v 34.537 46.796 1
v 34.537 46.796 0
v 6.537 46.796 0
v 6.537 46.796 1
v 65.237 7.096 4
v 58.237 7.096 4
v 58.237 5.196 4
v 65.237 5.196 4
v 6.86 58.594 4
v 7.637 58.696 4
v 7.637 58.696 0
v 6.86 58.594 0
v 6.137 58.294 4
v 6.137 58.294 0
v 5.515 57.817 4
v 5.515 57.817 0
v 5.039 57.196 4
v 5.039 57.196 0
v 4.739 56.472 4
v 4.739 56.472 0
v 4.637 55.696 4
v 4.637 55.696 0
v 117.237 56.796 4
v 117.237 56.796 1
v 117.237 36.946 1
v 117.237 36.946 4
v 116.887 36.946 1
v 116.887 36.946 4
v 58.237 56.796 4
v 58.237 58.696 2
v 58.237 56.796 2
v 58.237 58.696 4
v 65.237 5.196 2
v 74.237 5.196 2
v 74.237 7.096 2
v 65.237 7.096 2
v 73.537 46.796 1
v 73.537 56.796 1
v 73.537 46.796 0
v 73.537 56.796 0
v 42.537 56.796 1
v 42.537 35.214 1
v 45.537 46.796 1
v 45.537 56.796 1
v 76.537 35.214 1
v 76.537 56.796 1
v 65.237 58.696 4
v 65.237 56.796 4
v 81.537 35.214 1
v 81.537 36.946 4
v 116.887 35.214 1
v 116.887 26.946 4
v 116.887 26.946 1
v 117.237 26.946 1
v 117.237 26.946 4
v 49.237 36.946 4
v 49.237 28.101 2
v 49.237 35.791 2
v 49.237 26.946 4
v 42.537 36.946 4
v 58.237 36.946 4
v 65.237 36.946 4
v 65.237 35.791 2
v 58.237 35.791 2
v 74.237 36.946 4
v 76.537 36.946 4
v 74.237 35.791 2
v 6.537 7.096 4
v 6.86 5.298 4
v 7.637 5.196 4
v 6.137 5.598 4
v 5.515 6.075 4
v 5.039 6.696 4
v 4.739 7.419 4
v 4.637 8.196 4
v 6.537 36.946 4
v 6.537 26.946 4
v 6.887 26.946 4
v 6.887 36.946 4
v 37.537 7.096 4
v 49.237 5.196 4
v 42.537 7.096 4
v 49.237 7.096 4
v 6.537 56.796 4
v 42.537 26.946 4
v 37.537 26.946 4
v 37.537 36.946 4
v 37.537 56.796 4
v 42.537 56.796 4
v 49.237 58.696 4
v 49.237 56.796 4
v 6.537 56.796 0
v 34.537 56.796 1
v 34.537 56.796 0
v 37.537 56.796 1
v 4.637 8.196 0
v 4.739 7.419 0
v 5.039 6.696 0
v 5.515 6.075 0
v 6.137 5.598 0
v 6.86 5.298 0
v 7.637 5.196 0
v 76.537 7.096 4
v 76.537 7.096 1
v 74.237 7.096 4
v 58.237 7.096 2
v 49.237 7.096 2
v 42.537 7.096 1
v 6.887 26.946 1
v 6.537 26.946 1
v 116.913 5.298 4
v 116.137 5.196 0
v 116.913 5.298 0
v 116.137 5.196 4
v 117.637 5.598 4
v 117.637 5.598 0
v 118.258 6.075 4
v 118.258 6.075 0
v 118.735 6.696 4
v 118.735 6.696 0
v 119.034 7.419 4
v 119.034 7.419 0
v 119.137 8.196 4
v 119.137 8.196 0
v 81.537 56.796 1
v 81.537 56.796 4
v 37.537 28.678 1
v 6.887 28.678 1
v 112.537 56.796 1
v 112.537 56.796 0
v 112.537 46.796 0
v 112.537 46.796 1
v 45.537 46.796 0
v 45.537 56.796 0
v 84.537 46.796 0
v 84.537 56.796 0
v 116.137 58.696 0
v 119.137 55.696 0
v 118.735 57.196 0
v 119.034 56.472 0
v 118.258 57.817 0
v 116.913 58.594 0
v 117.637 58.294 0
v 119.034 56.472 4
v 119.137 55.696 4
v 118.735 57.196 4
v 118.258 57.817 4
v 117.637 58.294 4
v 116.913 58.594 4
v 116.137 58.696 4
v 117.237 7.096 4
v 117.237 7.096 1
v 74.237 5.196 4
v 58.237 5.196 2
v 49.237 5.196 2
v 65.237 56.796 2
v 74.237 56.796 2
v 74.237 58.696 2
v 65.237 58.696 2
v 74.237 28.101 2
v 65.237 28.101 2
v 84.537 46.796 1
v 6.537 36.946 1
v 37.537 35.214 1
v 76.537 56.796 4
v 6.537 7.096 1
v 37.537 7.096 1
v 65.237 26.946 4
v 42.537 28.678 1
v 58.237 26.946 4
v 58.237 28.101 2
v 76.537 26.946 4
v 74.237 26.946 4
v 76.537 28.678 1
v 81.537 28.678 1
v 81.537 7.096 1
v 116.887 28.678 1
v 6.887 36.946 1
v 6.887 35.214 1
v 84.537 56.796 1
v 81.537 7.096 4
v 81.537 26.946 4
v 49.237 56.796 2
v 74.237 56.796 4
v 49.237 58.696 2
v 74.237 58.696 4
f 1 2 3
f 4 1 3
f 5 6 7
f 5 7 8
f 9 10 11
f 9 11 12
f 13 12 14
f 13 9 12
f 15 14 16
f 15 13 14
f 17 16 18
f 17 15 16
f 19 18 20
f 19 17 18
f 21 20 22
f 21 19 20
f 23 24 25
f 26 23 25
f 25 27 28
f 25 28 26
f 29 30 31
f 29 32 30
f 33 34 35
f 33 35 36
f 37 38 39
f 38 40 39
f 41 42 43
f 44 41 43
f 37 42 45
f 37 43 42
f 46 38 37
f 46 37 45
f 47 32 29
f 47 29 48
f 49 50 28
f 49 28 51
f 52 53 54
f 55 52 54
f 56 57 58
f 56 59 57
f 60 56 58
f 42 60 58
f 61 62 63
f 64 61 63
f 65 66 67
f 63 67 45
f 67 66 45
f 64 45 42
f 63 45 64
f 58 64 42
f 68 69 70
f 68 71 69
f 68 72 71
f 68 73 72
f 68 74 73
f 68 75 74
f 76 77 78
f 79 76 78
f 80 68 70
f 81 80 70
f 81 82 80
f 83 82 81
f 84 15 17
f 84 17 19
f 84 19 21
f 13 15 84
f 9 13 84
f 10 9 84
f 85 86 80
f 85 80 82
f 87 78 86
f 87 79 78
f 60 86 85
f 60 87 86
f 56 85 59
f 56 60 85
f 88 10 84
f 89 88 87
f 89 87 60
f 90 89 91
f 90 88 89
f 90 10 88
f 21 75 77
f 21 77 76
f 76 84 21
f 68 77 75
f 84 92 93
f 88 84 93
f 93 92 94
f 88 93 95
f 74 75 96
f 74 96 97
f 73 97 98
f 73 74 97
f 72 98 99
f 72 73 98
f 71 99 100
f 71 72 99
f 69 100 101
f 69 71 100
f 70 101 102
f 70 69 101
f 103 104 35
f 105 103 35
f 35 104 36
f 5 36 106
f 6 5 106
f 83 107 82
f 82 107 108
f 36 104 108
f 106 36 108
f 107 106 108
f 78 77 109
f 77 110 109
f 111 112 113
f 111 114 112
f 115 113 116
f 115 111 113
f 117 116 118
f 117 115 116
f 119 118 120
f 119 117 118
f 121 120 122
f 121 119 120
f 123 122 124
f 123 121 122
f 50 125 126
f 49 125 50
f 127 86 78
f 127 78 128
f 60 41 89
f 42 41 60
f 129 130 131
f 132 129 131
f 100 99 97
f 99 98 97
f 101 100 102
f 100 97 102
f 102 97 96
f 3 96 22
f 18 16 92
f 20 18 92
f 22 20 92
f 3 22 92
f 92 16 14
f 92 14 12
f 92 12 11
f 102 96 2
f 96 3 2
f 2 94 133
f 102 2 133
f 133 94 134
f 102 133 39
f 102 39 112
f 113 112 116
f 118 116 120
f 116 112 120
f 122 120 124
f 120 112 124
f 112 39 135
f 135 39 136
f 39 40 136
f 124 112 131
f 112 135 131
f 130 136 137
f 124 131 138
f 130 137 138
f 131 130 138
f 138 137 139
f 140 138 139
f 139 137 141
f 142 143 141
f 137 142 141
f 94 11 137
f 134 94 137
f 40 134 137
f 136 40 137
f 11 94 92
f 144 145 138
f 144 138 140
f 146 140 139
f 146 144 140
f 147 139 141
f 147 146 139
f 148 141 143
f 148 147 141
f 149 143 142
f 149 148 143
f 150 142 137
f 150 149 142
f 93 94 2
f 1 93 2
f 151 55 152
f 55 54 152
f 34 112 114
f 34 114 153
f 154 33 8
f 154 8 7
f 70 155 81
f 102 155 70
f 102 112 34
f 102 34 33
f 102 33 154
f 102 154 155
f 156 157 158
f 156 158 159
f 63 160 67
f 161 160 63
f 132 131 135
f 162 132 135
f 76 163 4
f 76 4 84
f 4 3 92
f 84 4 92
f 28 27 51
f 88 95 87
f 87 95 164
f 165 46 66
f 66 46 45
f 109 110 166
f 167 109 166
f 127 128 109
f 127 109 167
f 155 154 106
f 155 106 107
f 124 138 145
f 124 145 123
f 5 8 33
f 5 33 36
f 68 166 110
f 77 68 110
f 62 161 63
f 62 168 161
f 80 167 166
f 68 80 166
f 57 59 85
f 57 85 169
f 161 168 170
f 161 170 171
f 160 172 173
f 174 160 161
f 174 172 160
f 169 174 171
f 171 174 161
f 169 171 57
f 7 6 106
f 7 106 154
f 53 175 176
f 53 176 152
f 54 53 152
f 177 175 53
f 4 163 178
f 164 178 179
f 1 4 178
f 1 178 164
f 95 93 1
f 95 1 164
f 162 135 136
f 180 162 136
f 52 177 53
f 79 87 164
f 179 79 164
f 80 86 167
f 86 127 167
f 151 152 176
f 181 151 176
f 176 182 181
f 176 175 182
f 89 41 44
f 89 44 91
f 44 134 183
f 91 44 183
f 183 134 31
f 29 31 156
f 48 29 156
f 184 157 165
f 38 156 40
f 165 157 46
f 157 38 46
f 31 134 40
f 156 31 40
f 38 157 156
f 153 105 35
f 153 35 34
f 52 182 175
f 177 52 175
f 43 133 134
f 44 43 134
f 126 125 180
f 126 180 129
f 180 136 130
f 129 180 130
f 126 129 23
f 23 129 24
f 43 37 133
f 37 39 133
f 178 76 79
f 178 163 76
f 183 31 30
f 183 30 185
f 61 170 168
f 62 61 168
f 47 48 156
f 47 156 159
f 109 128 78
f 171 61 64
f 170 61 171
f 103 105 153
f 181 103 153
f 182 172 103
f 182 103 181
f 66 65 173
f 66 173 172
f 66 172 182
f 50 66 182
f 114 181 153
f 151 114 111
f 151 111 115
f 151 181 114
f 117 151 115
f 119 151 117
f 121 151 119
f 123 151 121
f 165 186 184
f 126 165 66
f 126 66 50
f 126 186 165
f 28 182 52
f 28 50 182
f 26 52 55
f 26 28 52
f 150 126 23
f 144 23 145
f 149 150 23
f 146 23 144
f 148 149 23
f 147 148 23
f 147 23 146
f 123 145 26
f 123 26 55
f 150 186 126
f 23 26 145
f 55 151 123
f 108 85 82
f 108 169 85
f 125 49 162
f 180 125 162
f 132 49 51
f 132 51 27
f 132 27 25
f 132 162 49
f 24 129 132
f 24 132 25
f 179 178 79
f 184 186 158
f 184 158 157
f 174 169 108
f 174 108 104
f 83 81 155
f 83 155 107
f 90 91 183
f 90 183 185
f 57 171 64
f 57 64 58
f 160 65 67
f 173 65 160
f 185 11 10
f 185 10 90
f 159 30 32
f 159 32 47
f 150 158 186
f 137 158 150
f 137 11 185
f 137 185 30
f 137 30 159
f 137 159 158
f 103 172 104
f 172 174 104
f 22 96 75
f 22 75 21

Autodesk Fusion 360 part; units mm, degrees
sketch "Schizzo1" plane through (0, 0, 0) normal (0, 0, 1) x (1, 0, 0)
  line L0 (4.5367, 58.7959) -> (119.2367, 58.7959) construction
  line L1 (119.2367, 58.7959) -> (119.2367, 5.0959) construction
  line L2 (119.2367, 5.0959) -> (4.5367, 5.0959) construction
  line L3 (4.5367, 5.0959) -> (4.5367, 58.7959) construction
  line L4 (4.5367, 31.9459) -> (119.2367, 31.9459) construction
  line L5 (61.8867, 58.7959) -> (61.8867, 5.0959) construction
  line L6 (119.1367, 5.1959) -> (4.6367, 5.1959)
  line L7 (4.6367, 5.1959) -> (4.6367, 58.6959)
  line L8 (4.6367, 58.6959) -> (119.1367, 58.6959)
  line L9 (119.1367, 58.6959) -> (119.1367, 5.1959)
  line L10 (117.2367, 7.0959) -> (6.5367, 7.0959)
  line L11 (6.5367, 7.0959) -> (6.5367, 56.7959)
  line L12 (6.5367, 56.7959) -> (117.2367, 56.7959)
  line L13 (117.2367, 56.7959) -> (117.2367, 7.0959)
  line L14 (6.5367, 56.7959) -> (34.5367, 56.7959)
  line L15 (34.5367, 56.7959) -> (34.5367, 46.7959)
  line L16 (34.5367, 46.7959) -> (6.5367, 46.7959)
  line L17 (6.5367, 46.7959) -> (6.5367, 56.7959)
  line L18 (73.5367, 56.7959) -> (73.5367, 46.7959)
  line L19 (73.5367, 46.7959) -> (45.5367, 46.7959)
  line L20 (45.5367, 46.7959) -> (45.5367, 56.7959)
  line L21 (45.5367, 56.7959) -> (73.5367, 56.7959)
  line L22 (4.5367, 36.9459) -> (119.1367, 36.9459)
  line L23 (4.5367, 26.9459) -> (119.1367, 26.9459)
  line L24 (61.8867, 58.7959) -> (61.8867, 5.0959)
  line L25 (112.5367, 56.7959) -> (112.5367, 46.7959)
  line L26 (112.5367, 46.7959) -> (84.5367, 46.7959)
  line L27 (84.5367, 46.7959) -> (84.5367, 56.7959)
  line L28 (84.5367, 56.7959) -> (112.5367, 56.7959)
  line L29 (37.5367, 58.7959) -> (37.5367, 5.0959)
  line L30 (42.5367, 58.7959) -> (42.5367, 5.0959)
  line L31 (76.5367, 58.7959) -> (76.5367, 5.0959)
  line L32 (81.5367, 58.6959) -> (81.5367, 5.0959)
  dimension "d1" = 114.7
  dimension "d2" = 53.7
  dimension "d3" = 0.1
  dimension "d6" = 2
  dimension "d7" = 28
  dimension "d8" = 10
  dimension "d11" = 39
  dimension "d12" = 0
  dimension "d15" = 10
  dimension "d38" = 5
  dimension "d39" = 3
  dimension "d40" = 5
  dimension "d41" = 3
extrude "Estrusione1" add sketch "Schizzo1" along normal blind 1 contours L10 L13 L23 L32 | L10 L23 L31 L32 | L13 L22 L23 L32 | L10 L23 L24 L31 | L22 L23 L31 L32 | L12 L13 L22 L25 L26 L27 L32 | L10 L23 L24 L30 | L22 L23 L24 L31 | L12 L22 L31 L32 | L10 L23 L29 L30 | L22 L23 L24 L30 | L12 L18 L19 L22 L24 L31 | L10 L11 L23 L29 | L22 L23 L29 L30 | L12 L19 L20 L22 L24 L30 | L11 L22 L23 L29 | L12 L22 L29 L30 | L11 L12 L15 L16 L22 L29
extrude "Estrusione2" add sketch "Schizzo1" along normal blind 4 contours L6 L9 L10 L13 L23 L32 | L6 L10 L31 L32 | L9 L13 L22 L23 | L6 L10 L24 L31 | L8 L9 L12 L13 L22 L28 L32 | L13 L22 L23 L32 | L6 L10 L24 L30 | L22 L23 L31 L32 | L6 L10 L29 L30 | L22 L23 L24 L31 | L8 L12 L31 L32 | L6 L7 L10 L11 L23 L29 | L22 L23 L24 L30 | L8 L12 L21 L24 L31 | L22 L23 L29 L30 | L8 L12 L21 L24 L30 | L7 L11 L22 L23 | L11 L22 L23 L29 | L8 L12 L29 L30 | L7 L8 L11 L12 L14 L17 L22 L29
fillet "Raccordo1" radius 3 4 edges at (4.6367, 5.1959, 2) (119.1367, 5.1959, 2) (119.1367, 58.6959, 2) (4.6367, 58.6959, 2)
ref_plane "Piano di lavoro1" through (61.8867, 31.9459, 0) normal (-1, 0, 0) x (0, -1, 0)
sketch "Schizzo3" plane through (61.8867, 0, 0) normal (-1, 0, 0) x (0, -1, 0)
  line L0 (-26.9459, 4) -> (-36.9459, 4) construction
  line L1 (-36.9459, 4) -> (-36.9459, 0) construction
  line L2 (-36.9459, 0) -> (-26.9459, 0) construction
  line L3 (-26.9459, 0) -> (-26.9459, 4) construction
  line L4 (-55.6959, 4) -> (-8.1959, 4) construction
  line L5 (-58.7959, 0) -> (-5.0959, 0) construction
  line L6 (-26.9459, 1) -> (-26.9459, 4) construction
  line L7 (-36.9459, 1) -> (-36.9459, 4) construction
  line L8 (-31.9459, 4) -> (-31.9459, 0) construction
  line L9 (-26.9459, 1) -> (-36.9459, 1) construction
  line L10 (-26.9459, 1) -> (-26.9459, 4)
  line L11 (-26.9459, 4) -> (-28.678, 1)
  line L12 (-28.678, 1) -> (-26.9459, 1)
  line L13 (-36.9459, 1) -> (-36.9459, 4)
  line L14 (-36.9459, 4) -> (-35.2139, 1)
  line L15 (-35.2139, 1) -> (-36.9459, 1)
  dimension "d20" = 30
extrude "Estrusione4" cut sketch "Schizzo3" along normal mid plane 110
sketch "Schizzo4" plane through (0, 0, 4) normal (0, 0, 1) x (-1, 0, 0)
  arc A0 (-7.6367, -58.6959) -> (-4.6367, -55.6959) centre (-7.6367, -55.6959) ccw
  line L0 (-4.6367, -55.6959) -> (-4.6367, -8.1959)
  arc A1 (-4.6367, -8.1959) -> (-7.6367, -5.1959) centre (-7.6367, -8.1959) ccw
  line L1 (-7.6367, -5.1959) -> (-116.1367, -5.1959)
  arc A2 (-116.1367, -5.1959) -> (-119.1367, -8.1959) centre (-116.1367, -8.1959) ccw
  line L2 (-119.1367, -8.1959) -> (-119.1367, -55.6959)
  arc A3 (-119.1367, -55.6959) -> (-116.1367, -58.6959) centre (-116.1367, -55.6959) ccw
  line L3 (-116.1367, -58.6959) -> (-7.6367, -58.6959)
  line L4 (-117.2367, -36.9459) -> (-116.8867, -36.9459)
  line L5 (-116.8867, -36.9459) -> (-6.8867, -36.9459)
  line L6 (-6.8867, -36.9459) -> (-6.5367, -36.9459)
  line L7 (-6.5367, -36.9459) -> (-6.5367, -56.7959)
  line L8 (-6.5367, -56.7959) -> (-117.2367, -56.7959)
  line L9 (-117.2367, -56.7959) -> (-117.2367, -36.9459)
  line L10 (-117.2367, -7.0959) -> (-6.5367, -7.0959)
  line L11 (-6.5367, -7.0959) -> (-6.5367, -26.9459)
  line L12 (-6.5367, -26.9459) -> (-6.8867, -26.9459)
  line L13 (-6.8867, -26.9459) -> (-116.8867, -26.9459)
  line L14 (-117.2367, -26.9459) -> (-117.2367, -7.0959)
  line L15 (-4.6367, -58.6959) -> (-119.1367, -58.6959) construction
  line L16 (-119.1367, -58.6959) -> (-119.1367, -5.1959) construction
  line L17 (-119.1367, -5.1959) -> (-4.6367, -5.1959) construction
  line L18 (-4.6367, -5.1959) -> (-4.6367, -58.6959) construction
  line L19 (-49.2367, -58.6959) -> (-58.2367, -58.6959)
  line L20 (-58.2367, -58.6959) -> (-58.2367, -5.1959)
  line L21 (-58.2367, -5.1959) -> (-49.2367, -5.1959)
  line L22 (-49.2367, -5.1959) -> (-49.2367, -58.6959)
  line L23 (-65.2367, -58.6959) -> (-74.2367, -58.6959)
  line L24 (-74.2367, -58.6959) -> (-74.2367, -5.1959)
  line L25 (-74.2367, -5.1959) -> (-65.2367, -5.1959)
  line L26 (-65.2367, -5.1959) -> (-65.2367, -58.6959)
  line L27 (-53.7367, -58.6959) -> (-53.7367, -5.1959) construction
  line L28 (-69.7367, -58.6959) -> (-69.7367, -5.1959) construction
  line L29 (-2.7367, -58.6959) -> (-2.7367, -5.1959) construction
  line L30 (-116.8867, -26.9459) -> (-117.2367, -26.9459)
  dimension "d28" = 9
  dimension "d29" = 9
  dimension "d33" = 1.9
  dimension "d34" = 51
  dimension "d35" = 67
extrude "Estrusione6" cut sketch "Schizzo4" against normal blind 2 contours L3 L8 L19 L20 L22 | L5 L8 L20 L22 | L3 L8 L23 L24 L26 | L5 L13 L20 L22 | L1 L10 L20 L21 L22 | L5 L8 L24 L26 | L10 L13 L20 L22 | L5 L13 L24 L26 | L1 L10 L24 L25 L26 | L10 L13 L24 L26
extrude "Estrusione7" add sketch "Schizzo1" along normal blind 4 contours L10 L23 L31 L32 | L22 L23 L31 L32 | L12 L22 L31 L32 | L10 L23 L29 L30 | L22 L23 L29 L30 | L12 L22 L29 L30
